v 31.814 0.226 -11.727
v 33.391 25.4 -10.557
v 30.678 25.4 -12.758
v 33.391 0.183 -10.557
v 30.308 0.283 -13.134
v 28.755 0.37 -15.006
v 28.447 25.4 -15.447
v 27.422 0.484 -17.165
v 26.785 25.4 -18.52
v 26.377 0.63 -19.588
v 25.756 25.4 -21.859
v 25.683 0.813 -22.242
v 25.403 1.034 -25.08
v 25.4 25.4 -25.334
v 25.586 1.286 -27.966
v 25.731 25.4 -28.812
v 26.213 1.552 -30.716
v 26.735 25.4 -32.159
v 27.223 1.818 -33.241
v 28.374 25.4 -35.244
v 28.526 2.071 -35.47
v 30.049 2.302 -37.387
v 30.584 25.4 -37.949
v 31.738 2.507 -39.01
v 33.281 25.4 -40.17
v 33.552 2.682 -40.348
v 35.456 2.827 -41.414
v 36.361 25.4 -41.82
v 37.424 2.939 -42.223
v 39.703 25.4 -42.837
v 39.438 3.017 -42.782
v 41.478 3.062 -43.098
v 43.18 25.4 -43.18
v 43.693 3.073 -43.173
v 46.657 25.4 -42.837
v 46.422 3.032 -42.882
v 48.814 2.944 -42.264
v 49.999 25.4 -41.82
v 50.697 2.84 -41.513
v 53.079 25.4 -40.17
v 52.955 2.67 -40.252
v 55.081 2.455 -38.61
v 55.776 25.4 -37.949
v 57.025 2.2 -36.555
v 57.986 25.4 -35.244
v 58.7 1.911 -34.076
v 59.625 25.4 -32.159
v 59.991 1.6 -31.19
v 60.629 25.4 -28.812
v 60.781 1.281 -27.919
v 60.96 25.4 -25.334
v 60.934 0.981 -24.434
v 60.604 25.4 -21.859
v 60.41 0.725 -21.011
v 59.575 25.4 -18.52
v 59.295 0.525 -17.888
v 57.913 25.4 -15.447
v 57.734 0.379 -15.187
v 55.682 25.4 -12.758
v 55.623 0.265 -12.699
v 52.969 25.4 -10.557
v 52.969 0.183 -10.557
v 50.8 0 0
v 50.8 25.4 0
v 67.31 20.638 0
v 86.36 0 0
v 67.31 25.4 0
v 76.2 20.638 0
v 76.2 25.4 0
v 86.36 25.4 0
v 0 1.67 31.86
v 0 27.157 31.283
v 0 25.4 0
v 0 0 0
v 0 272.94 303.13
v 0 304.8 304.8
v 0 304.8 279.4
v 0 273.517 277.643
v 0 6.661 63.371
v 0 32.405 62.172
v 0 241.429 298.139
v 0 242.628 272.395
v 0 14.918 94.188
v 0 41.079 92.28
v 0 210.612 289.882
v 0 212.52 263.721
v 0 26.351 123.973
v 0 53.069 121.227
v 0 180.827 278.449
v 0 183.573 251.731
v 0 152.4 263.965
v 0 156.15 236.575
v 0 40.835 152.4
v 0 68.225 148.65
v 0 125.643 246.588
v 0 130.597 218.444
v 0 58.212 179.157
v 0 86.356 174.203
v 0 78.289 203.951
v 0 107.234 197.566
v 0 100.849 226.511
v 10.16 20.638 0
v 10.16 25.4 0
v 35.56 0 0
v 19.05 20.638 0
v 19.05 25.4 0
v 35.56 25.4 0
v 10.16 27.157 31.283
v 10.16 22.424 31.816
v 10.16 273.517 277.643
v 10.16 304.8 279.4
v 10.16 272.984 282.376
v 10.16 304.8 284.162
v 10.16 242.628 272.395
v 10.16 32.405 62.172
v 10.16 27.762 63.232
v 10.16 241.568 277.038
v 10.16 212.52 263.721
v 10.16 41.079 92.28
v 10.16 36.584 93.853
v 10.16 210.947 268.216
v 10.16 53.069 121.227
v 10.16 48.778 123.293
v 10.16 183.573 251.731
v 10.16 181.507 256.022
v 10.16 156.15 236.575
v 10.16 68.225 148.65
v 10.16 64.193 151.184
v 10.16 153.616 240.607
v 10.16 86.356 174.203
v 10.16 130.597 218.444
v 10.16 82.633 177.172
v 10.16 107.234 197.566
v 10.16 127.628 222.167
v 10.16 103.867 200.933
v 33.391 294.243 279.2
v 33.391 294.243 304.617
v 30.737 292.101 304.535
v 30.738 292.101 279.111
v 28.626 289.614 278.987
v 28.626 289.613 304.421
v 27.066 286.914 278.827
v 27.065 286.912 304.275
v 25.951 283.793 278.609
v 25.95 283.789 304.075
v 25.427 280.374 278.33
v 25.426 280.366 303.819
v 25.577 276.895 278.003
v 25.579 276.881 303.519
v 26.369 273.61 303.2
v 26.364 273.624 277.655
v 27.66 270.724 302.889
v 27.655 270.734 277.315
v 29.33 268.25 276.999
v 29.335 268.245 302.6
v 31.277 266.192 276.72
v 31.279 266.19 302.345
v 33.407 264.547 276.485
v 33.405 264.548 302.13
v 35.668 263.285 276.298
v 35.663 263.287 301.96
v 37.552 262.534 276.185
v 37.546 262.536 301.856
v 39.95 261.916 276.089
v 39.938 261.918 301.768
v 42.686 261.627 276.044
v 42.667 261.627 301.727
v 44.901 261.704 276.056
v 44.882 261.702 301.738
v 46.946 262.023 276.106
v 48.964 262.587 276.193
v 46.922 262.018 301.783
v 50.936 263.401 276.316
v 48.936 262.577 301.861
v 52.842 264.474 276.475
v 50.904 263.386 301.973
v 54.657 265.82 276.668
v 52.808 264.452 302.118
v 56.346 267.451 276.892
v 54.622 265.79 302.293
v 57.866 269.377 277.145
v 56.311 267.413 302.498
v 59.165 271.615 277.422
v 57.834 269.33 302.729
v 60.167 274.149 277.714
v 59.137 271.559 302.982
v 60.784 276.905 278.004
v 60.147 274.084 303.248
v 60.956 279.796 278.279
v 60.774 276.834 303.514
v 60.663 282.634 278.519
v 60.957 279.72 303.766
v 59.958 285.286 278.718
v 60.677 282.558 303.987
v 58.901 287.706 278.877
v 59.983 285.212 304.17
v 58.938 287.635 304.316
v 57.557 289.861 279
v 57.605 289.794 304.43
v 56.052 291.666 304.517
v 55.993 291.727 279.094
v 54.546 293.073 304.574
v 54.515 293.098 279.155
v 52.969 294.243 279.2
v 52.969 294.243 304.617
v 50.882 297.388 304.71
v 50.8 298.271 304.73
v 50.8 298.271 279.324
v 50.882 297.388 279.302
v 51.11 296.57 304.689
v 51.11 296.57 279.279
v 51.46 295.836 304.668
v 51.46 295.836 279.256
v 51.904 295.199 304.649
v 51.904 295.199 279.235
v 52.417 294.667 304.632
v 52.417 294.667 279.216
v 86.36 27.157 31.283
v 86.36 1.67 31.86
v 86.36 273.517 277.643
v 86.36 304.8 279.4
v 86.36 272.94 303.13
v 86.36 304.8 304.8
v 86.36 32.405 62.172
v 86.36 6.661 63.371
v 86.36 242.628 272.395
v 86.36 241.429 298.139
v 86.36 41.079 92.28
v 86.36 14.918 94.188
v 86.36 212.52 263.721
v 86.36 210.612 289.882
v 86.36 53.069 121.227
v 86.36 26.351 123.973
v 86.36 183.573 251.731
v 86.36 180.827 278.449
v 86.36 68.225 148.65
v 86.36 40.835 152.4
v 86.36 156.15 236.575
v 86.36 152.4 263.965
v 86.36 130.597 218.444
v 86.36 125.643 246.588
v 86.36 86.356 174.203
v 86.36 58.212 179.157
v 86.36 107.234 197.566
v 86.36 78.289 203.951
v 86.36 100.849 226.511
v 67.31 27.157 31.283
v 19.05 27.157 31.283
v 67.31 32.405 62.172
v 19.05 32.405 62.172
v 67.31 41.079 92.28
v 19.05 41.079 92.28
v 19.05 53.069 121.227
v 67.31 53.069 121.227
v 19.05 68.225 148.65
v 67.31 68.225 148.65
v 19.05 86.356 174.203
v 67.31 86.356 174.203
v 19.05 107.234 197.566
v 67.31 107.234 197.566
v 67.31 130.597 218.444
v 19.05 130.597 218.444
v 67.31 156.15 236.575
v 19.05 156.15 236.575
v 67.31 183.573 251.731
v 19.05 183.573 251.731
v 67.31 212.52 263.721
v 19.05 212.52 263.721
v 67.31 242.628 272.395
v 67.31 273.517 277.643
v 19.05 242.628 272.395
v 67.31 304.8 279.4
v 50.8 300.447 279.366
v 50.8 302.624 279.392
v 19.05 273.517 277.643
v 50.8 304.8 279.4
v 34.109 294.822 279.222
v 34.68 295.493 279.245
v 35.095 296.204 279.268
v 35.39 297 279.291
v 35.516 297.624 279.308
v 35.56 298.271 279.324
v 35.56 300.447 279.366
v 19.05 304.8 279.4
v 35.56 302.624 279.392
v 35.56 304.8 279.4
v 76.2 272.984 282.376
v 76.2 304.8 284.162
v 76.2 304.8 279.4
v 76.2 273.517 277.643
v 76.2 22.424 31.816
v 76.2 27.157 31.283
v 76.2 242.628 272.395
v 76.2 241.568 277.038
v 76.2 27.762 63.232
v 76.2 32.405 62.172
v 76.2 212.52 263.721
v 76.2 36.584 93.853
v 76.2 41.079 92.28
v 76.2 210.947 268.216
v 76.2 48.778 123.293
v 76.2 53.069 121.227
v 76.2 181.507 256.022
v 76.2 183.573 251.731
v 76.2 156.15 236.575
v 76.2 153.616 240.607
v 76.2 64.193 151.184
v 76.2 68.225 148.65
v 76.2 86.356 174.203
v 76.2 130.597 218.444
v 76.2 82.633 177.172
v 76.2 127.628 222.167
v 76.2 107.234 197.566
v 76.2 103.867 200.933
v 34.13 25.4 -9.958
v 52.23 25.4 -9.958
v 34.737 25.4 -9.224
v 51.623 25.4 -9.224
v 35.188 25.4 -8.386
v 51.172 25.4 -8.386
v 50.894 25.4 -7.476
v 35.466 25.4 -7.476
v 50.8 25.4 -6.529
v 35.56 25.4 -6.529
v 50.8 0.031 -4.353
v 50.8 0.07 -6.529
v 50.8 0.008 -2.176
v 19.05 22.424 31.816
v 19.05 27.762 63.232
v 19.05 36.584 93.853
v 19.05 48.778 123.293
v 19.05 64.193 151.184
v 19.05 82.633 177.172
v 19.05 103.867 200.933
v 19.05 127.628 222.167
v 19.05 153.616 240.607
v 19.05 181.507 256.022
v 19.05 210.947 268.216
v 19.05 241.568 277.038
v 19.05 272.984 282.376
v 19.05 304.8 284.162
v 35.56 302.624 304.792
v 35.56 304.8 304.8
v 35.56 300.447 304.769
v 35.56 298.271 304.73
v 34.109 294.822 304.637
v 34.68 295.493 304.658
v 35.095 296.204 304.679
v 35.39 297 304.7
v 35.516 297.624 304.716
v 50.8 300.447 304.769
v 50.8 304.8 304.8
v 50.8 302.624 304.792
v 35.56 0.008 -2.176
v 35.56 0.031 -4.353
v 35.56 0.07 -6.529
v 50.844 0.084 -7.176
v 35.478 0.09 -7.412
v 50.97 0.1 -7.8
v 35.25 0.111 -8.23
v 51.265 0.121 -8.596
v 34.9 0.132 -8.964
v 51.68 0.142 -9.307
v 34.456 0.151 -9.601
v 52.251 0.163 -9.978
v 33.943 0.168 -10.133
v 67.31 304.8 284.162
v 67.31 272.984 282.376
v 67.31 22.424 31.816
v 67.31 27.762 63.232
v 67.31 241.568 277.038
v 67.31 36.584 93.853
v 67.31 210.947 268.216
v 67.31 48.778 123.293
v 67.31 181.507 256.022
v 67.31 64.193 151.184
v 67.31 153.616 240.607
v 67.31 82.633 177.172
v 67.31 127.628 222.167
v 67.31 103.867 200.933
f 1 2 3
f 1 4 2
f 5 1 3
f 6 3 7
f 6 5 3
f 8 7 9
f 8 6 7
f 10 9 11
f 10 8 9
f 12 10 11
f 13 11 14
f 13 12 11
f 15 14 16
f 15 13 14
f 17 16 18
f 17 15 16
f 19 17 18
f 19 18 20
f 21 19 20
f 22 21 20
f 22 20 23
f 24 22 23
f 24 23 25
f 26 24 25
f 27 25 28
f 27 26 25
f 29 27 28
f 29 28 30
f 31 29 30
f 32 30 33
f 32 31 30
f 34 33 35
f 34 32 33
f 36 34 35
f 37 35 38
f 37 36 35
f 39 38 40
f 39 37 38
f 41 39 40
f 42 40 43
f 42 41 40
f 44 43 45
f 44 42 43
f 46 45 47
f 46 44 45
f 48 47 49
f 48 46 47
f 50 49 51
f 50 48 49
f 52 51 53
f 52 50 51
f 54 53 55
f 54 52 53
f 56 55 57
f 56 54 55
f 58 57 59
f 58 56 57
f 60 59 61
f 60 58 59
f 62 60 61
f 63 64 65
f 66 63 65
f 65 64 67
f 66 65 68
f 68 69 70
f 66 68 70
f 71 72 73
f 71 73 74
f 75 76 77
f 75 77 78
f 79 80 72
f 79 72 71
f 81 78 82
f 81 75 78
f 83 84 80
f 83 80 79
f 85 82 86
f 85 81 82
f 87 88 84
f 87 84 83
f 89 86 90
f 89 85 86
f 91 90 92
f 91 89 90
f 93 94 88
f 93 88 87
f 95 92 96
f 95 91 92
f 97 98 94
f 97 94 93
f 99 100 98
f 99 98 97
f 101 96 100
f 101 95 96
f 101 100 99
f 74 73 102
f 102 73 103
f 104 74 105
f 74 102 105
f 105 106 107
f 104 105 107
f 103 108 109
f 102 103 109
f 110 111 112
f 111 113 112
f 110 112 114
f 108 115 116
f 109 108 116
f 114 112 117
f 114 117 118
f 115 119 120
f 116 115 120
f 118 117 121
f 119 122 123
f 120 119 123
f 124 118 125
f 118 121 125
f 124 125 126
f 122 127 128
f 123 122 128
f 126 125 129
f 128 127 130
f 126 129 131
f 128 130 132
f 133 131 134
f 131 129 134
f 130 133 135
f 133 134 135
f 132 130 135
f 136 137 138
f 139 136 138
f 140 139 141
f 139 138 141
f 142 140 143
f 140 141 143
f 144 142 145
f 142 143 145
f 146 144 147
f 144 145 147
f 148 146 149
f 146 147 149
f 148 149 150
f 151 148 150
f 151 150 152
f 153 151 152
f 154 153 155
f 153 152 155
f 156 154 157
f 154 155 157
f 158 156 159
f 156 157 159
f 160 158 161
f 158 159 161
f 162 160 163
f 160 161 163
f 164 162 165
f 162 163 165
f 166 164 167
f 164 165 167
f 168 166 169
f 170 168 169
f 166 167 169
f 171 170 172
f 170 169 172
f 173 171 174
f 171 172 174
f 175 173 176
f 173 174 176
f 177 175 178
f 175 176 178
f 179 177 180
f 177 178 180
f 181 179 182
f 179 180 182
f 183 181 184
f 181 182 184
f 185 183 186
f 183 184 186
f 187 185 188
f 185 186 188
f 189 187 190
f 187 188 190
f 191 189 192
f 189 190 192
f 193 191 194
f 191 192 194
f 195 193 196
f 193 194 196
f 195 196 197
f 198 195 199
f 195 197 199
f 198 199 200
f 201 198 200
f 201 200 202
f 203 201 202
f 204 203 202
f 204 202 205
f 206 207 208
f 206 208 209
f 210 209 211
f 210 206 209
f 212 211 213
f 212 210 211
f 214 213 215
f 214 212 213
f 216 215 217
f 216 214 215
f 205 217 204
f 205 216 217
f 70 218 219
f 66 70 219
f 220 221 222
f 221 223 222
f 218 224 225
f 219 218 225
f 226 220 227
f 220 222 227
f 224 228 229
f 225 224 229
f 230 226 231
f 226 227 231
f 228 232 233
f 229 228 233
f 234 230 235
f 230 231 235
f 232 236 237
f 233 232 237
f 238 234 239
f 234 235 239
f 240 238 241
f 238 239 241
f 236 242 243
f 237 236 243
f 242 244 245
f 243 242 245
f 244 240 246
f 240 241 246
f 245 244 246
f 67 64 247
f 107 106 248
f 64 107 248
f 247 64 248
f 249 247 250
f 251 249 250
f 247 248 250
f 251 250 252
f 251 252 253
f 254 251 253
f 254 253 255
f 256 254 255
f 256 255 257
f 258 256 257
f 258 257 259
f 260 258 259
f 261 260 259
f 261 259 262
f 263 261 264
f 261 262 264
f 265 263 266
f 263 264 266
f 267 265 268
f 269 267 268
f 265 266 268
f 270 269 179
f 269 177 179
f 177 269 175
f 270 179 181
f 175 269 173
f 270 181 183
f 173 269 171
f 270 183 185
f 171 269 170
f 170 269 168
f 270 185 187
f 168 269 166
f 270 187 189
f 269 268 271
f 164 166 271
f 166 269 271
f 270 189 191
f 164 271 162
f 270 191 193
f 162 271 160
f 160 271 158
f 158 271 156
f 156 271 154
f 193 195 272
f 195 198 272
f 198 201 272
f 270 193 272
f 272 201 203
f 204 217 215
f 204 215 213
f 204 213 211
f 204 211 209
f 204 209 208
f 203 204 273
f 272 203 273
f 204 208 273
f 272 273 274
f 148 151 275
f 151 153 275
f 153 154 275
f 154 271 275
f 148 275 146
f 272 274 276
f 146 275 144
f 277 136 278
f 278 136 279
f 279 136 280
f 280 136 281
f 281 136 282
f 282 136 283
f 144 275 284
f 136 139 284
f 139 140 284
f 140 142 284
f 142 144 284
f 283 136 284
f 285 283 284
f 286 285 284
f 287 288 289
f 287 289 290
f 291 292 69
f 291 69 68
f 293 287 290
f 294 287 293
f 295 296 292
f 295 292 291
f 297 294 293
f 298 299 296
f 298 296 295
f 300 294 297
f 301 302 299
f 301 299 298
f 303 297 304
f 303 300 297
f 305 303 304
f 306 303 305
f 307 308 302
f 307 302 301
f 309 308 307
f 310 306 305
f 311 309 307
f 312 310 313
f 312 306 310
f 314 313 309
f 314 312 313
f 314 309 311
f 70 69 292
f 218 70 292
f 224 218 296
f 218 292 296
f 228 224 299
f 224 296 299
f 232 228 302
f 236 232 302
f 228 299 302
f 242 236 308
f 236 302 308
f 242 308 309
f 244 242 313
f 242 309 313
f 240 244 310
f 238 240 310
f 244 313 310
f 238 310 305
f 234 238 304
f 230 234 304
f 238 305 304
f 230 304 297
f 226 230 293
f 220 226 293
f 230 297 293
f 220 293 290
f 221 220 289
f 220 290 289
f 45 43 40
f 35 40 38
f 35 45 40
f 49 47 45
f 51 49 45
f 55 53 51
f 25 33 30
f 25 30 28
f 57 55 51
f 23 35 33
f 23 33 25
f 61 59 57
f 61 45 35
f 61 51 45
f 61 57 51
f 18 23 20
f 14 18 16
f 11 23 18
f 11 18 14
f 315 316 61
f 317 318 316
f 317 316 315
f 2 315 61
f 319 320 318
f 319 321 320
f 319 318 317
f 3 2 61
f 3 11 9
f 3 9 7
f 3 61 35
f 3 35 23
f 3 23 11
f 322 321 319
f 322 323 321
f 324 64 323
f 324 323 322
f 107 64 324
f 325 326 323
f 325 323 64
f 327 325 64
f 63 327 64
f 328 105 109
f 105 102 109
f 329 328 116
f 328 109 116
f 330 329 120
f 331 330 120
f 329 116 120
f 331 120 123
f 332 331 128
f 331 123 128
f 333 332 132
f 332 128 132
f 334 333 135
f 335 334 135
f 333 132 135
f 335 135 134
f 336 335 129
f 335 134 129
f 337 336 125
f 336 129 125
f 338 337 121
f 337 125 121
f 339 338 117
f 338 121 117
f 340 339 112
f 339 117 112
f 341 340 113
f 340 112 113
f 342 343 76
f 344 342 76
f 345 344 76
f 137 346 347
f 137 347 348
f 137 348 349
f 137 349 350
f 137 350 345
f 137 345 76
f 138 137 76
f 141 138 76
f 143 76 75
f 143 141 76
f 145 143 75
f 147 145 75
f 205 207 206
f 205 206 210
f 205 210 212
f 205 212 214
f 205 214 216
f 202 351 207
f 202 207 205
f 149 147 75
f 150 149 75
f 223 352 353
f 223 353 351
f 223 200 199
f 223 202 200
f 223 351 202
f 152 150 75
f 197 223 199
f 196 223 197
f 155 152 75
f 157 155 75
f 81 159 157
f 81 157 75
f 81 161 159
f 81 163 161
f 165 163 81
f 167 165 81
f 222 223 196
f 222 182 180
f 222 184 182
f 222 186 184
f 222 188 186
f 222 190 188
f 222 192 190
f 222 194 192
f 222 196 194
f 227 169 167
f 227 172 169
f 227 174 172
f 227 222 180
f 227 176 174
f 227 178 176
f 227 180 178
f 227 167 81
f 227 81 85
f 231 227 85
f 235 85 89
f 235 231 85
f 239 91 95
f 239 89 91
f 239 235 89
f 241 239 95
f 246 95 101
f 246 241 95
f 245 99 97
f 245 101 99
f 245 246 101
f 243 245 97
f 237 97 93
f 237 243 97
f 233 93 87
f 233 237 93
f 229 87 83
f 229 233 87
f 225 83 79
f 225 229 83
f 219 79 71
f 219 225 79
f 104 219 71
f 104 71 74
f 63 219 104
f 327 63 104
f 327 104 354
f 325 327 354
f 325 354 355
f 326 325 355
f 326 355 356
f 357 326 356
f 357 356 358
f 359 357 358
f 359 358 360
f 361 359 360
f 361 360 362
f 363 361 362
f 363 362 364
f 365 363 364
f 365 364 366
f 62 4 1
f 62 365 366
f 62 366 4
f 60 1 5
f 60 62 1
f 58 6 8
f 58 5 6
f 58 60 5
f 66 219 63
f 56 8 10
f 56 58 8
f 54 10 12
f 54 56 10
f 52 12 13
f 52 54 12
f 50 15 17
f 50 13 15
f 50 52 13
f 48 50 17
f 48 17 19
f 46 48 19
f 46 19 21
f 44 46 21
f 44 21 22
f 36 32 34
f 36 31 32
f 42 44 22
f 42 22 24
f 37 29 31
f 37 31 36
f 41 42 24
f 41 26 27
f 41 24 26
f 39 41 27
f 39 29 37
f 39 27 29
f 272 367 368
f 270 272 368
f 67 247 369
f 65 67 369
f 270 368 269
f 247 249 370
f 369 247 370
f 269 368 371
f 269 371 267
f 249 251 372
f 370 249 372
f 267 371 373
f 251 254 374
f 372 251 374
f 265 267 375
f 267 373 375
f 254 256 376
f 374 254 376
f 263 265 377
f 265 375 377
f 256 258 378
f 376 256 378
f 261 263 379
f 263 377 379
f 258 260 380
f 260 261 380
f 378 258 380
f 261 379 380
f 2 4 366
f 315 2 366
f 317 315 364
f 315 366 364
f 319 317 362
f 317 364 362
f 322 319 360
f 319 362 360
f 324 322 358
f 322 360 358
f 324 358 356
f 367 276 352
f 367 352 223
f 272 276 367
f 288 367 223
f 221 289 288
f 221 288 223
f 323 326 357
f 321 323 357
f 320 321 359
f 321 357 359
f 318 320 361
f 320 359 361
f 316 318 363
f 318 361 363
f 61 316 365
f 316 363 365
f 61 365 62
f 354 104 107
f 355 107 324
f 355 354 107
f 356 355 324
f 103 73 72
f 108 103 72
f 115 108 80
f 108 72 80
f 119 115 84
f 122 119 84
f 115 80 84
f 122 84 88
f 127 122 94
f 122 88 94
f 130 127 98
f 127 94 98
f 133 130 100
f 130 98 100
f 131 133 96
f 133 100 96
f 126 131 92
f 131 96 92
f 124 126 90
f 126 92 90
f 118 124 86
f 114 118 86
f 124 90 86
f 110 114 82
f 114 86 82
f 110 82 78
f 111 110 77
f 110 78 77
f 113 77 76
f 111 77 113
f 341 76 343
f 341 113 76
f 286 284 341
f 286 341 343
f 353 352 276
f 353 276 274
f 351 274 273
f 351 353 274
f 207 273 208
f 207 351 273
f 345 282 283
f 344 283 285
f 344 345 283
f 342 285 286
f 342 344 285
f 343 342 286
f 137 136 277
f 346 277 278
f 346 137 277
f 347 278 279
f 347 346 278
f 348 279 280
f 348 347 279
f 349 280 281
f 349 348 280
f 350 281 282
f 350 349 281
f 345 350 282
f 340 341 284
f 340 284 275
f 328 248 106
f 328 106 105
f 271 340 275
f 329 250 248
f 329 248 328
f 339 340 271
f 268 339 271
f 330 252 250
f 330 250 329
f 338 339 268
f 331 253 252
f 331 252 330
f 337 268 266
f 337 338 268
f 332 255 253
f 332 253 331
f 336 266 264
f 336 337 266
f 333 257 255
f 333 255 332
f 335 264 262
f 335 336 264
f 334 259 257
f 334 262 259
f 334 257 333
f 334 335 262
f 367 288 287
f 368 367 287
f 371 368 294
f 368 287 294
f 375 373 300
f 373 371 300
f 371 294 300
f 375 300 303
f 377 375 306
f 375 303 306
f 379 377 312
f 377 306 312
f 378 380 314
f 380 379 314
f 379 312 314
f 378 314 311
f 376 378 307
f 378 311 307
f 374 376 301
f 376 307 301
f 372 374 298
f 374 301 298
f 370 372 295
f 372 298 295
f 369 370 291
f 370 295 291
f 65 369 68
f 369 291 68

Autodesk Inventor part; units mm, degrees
ref_plane "YZ Plane" through (0, 0, 0) normal (1, 0, 0) x (0, 1, 0)
ref_plane "XZ Plane" through (0, 0, 0) normal (0, 1, 0) x (-1, 0, 0)
ref_plane "XY Plane" through (0, 0, 0) normal (0, 0, 1) x (1, 0, 0)
sketch "Track sketch" plane through (0, 0, 0) normal (0, 0, 1) x (1, 0, 0)
  line L0 (0, 0) -> (86.36, 0)
  line L1 (86.36, 0) -> (86.36, 25.4)
  line L2 (0, 25.4) -> (0, 0)
  line L3 (19.05, 25.4) -> (19.05, 20.6375)
  line L4 (19.05, 20.6375) -> (10.16, 20.6375)
  line L5 (10.16, 20.6375) -> (10.16, 25.4)
  line L6 (43.18, 25.4) -> (43.18, 0) construction
  line L7 (67.31, 25.4) -> (67.31, 20.6375)
  line L8 (67.31, 20.6375) -> (76.2, 20.6375)
  line L9 (76.2, 20.6375) -> (76.2, 25.4)
  line L10 (10.16, 25.4) -> (0, 25.4)
  line L11 (86.36, 25.4) -> (76.2, 25.4)
  line L12 (67.31, 25.4) -> (19.05, 25.4)
  line L13 (0, 0) -> (0, 304.8) construction
  line L14 (0, 304.8) -> (86.36, 304.8) construction
  line L15 (0, 0) -> (0, -25.4)
  line L16 (0, -25.4) -> (86.36, -25.4)
  line L17 (86.36, -25.4) -> (86.36, 0)
  dimension "d0" = 86.36
  dimension "d1" = 25.4
  dimension "d2" = 19.05
  dimension "d3" = 10.16
  dimension "d6" = 4.7625
  dimension "d23" = 304.8
  dimension "d47" = 25.4
revolve "Revolution1" add sketch "Track sketch" angle 90 about axis through (0, 304.8, 0) along (-1, 0, 0) contours L2 L10 L5 L4 L3 L12 L7 L8 L9 L11 L1 L0
sketch "Sketch3" plane through (0, 0, 0) normal (0, 1, 0) x (-1, 0, 0)
  line L0 (-19.50225, 0) -> (-66.85775, 0)
  line L1 (-43.18, 304.8) -> (-43.18, 0) construction
  line L2 (-43.18, 0) -> (-43.18, -37.562444) construction
  arc A0 (-52.968989, -10.557355) -> (-33.391011, -10.557355) centre (-43.18, -25.4) ccw
  line L3 (-50.8, 0) -> (-35.56, 0)
  line L4 (-35.56, 0) -> (-35.56, -6.528638)
  line L5 (-35.56, -9.335629) -> (-50.8, -9.335629) construction
  line L6 (-50.8, -6.528638) -> (-50.8, 0)
  arc A1 (-52.968989, -10.557355) -> (-50.8, -6.528638) centre (-55.626, -6.528638) ccw
  arc A2 (-35.56, -6.528638) -> (-33.391011, -10.557355) centre (-30.734, -6.528638) ccw
  line L7 (0, 0) -> (-86.36, 0)
  line L8 (-86.36, 0) -> (-86.36, 304.8)
  line L9 (0, 304.8) -> (-86.36, 304.8)
  line L10 (0, 0) -> (0, 304.8)
  line L11 (0, 0) -> (-86.36, 0)
  line L12 (0, 304.8) -> (-86.36, 304.8) construction
  line L13 (-43.18, 304.8) -> (-43.18, 65.498651) construction
  point P0 (-43.18, 279.4)
  dimension "d25" = 279.4
  dimension "d26" = 35.56
  dimension "d27" = 25.4
  dimension "d28" = 15.24
  dimension "d29" = 4.826
  dimension "d32" = 86.36
  dimension "d33" = 43.18
  dimension "d34" = 43.18
  dimension "d35" = 25.4
extrude "Extrusion4" add sketch "Sketch3" along normal blind 25.4 contours L4 A2 A0 A1 L6 L0
ref_plane "Work Plane1" through (0, 304.8, 304.8) normal (0, 0, 1) x (1, 0, 0)
sketch "Sketch4" plane through (0, 304.8, 304.8) normal (0, 0, 1) x (1, 0, 0)
  line L0 (0, -304.8) -> (35.56, -304.8)
  line L1 (35.56, -304.8) -> (50.8, -304.8)
  line L2 (50.8, -304.8) -> (86.36, -304.8)
  line L3 (86.36, -304.8) -> (86.36, 0)
  line L4 (0, 0) -> (86.36, 0)
  line L5 (0, -304.8) -> (0, 0)
  line L6 (67.31, 0) -> (19.05, 0)
  line L7 (43.18, 304.8) -> (43.18, 0) construction
  line L8 (43.18, 0) -> (43.18, -37.562444) construction
  arc A0 (33.391011, -10.557355) -> (52.968989, -10.557355) centre (43.18, -25.4) ccw
  line L9 (35.56, 0) -> (50.8, 0)
  line L10 (50.8, 0) -> (50.8, -6.528638)
  line L11 (50.8, -9.335629) -> (35.56, -9.335629) construction
  line L12 (35.56, -6.528638) -> (35.56, 0)
  arc A1 (33.391011, -10.557355) -> (35.56, -6.528638) centre (30.734, -6.528638) ccw
  arc A2 (50.8, -6.528638) -> (52.968989, -10.557355) centre (55.626, -6.528638) ccw
  point P0 (43.18, 279.4)
  dimension "d38" = 279.4
  dimension "d39" = 35.56
  dimension "d40" = 25.4
  dimension "d41" = 15.24
  dimension "d42" = 4.826
  dimension "d43" = 43.18
  dimension "d44" = 25.4
extrude "Extrusion5" cut sketch "Sketch4" against normal blind 50.8 contours L4 L10 A2 A0 A1 L12
sketch "Track sketch outline for Revolution2" plane through (0, 0, 0) normal (0, 0, 1) x (1, 0, 0)
  line L0 (86.36, 0) -> (0, 0)
  line L1 (86.36, -25.4) -> (86.36, 0)
  line L2 (0, -25.4) -> (86.36, -25.4)
  line L3 (0, 0) -> (0, -25.4)
revolve "Revolution2" cut sketch "Track sketch outline for Revolution2" angle 360 about axis through (0, 304.8, 0) along (1, 0, 0)
properties part number "Caufield_Straight_Track"
